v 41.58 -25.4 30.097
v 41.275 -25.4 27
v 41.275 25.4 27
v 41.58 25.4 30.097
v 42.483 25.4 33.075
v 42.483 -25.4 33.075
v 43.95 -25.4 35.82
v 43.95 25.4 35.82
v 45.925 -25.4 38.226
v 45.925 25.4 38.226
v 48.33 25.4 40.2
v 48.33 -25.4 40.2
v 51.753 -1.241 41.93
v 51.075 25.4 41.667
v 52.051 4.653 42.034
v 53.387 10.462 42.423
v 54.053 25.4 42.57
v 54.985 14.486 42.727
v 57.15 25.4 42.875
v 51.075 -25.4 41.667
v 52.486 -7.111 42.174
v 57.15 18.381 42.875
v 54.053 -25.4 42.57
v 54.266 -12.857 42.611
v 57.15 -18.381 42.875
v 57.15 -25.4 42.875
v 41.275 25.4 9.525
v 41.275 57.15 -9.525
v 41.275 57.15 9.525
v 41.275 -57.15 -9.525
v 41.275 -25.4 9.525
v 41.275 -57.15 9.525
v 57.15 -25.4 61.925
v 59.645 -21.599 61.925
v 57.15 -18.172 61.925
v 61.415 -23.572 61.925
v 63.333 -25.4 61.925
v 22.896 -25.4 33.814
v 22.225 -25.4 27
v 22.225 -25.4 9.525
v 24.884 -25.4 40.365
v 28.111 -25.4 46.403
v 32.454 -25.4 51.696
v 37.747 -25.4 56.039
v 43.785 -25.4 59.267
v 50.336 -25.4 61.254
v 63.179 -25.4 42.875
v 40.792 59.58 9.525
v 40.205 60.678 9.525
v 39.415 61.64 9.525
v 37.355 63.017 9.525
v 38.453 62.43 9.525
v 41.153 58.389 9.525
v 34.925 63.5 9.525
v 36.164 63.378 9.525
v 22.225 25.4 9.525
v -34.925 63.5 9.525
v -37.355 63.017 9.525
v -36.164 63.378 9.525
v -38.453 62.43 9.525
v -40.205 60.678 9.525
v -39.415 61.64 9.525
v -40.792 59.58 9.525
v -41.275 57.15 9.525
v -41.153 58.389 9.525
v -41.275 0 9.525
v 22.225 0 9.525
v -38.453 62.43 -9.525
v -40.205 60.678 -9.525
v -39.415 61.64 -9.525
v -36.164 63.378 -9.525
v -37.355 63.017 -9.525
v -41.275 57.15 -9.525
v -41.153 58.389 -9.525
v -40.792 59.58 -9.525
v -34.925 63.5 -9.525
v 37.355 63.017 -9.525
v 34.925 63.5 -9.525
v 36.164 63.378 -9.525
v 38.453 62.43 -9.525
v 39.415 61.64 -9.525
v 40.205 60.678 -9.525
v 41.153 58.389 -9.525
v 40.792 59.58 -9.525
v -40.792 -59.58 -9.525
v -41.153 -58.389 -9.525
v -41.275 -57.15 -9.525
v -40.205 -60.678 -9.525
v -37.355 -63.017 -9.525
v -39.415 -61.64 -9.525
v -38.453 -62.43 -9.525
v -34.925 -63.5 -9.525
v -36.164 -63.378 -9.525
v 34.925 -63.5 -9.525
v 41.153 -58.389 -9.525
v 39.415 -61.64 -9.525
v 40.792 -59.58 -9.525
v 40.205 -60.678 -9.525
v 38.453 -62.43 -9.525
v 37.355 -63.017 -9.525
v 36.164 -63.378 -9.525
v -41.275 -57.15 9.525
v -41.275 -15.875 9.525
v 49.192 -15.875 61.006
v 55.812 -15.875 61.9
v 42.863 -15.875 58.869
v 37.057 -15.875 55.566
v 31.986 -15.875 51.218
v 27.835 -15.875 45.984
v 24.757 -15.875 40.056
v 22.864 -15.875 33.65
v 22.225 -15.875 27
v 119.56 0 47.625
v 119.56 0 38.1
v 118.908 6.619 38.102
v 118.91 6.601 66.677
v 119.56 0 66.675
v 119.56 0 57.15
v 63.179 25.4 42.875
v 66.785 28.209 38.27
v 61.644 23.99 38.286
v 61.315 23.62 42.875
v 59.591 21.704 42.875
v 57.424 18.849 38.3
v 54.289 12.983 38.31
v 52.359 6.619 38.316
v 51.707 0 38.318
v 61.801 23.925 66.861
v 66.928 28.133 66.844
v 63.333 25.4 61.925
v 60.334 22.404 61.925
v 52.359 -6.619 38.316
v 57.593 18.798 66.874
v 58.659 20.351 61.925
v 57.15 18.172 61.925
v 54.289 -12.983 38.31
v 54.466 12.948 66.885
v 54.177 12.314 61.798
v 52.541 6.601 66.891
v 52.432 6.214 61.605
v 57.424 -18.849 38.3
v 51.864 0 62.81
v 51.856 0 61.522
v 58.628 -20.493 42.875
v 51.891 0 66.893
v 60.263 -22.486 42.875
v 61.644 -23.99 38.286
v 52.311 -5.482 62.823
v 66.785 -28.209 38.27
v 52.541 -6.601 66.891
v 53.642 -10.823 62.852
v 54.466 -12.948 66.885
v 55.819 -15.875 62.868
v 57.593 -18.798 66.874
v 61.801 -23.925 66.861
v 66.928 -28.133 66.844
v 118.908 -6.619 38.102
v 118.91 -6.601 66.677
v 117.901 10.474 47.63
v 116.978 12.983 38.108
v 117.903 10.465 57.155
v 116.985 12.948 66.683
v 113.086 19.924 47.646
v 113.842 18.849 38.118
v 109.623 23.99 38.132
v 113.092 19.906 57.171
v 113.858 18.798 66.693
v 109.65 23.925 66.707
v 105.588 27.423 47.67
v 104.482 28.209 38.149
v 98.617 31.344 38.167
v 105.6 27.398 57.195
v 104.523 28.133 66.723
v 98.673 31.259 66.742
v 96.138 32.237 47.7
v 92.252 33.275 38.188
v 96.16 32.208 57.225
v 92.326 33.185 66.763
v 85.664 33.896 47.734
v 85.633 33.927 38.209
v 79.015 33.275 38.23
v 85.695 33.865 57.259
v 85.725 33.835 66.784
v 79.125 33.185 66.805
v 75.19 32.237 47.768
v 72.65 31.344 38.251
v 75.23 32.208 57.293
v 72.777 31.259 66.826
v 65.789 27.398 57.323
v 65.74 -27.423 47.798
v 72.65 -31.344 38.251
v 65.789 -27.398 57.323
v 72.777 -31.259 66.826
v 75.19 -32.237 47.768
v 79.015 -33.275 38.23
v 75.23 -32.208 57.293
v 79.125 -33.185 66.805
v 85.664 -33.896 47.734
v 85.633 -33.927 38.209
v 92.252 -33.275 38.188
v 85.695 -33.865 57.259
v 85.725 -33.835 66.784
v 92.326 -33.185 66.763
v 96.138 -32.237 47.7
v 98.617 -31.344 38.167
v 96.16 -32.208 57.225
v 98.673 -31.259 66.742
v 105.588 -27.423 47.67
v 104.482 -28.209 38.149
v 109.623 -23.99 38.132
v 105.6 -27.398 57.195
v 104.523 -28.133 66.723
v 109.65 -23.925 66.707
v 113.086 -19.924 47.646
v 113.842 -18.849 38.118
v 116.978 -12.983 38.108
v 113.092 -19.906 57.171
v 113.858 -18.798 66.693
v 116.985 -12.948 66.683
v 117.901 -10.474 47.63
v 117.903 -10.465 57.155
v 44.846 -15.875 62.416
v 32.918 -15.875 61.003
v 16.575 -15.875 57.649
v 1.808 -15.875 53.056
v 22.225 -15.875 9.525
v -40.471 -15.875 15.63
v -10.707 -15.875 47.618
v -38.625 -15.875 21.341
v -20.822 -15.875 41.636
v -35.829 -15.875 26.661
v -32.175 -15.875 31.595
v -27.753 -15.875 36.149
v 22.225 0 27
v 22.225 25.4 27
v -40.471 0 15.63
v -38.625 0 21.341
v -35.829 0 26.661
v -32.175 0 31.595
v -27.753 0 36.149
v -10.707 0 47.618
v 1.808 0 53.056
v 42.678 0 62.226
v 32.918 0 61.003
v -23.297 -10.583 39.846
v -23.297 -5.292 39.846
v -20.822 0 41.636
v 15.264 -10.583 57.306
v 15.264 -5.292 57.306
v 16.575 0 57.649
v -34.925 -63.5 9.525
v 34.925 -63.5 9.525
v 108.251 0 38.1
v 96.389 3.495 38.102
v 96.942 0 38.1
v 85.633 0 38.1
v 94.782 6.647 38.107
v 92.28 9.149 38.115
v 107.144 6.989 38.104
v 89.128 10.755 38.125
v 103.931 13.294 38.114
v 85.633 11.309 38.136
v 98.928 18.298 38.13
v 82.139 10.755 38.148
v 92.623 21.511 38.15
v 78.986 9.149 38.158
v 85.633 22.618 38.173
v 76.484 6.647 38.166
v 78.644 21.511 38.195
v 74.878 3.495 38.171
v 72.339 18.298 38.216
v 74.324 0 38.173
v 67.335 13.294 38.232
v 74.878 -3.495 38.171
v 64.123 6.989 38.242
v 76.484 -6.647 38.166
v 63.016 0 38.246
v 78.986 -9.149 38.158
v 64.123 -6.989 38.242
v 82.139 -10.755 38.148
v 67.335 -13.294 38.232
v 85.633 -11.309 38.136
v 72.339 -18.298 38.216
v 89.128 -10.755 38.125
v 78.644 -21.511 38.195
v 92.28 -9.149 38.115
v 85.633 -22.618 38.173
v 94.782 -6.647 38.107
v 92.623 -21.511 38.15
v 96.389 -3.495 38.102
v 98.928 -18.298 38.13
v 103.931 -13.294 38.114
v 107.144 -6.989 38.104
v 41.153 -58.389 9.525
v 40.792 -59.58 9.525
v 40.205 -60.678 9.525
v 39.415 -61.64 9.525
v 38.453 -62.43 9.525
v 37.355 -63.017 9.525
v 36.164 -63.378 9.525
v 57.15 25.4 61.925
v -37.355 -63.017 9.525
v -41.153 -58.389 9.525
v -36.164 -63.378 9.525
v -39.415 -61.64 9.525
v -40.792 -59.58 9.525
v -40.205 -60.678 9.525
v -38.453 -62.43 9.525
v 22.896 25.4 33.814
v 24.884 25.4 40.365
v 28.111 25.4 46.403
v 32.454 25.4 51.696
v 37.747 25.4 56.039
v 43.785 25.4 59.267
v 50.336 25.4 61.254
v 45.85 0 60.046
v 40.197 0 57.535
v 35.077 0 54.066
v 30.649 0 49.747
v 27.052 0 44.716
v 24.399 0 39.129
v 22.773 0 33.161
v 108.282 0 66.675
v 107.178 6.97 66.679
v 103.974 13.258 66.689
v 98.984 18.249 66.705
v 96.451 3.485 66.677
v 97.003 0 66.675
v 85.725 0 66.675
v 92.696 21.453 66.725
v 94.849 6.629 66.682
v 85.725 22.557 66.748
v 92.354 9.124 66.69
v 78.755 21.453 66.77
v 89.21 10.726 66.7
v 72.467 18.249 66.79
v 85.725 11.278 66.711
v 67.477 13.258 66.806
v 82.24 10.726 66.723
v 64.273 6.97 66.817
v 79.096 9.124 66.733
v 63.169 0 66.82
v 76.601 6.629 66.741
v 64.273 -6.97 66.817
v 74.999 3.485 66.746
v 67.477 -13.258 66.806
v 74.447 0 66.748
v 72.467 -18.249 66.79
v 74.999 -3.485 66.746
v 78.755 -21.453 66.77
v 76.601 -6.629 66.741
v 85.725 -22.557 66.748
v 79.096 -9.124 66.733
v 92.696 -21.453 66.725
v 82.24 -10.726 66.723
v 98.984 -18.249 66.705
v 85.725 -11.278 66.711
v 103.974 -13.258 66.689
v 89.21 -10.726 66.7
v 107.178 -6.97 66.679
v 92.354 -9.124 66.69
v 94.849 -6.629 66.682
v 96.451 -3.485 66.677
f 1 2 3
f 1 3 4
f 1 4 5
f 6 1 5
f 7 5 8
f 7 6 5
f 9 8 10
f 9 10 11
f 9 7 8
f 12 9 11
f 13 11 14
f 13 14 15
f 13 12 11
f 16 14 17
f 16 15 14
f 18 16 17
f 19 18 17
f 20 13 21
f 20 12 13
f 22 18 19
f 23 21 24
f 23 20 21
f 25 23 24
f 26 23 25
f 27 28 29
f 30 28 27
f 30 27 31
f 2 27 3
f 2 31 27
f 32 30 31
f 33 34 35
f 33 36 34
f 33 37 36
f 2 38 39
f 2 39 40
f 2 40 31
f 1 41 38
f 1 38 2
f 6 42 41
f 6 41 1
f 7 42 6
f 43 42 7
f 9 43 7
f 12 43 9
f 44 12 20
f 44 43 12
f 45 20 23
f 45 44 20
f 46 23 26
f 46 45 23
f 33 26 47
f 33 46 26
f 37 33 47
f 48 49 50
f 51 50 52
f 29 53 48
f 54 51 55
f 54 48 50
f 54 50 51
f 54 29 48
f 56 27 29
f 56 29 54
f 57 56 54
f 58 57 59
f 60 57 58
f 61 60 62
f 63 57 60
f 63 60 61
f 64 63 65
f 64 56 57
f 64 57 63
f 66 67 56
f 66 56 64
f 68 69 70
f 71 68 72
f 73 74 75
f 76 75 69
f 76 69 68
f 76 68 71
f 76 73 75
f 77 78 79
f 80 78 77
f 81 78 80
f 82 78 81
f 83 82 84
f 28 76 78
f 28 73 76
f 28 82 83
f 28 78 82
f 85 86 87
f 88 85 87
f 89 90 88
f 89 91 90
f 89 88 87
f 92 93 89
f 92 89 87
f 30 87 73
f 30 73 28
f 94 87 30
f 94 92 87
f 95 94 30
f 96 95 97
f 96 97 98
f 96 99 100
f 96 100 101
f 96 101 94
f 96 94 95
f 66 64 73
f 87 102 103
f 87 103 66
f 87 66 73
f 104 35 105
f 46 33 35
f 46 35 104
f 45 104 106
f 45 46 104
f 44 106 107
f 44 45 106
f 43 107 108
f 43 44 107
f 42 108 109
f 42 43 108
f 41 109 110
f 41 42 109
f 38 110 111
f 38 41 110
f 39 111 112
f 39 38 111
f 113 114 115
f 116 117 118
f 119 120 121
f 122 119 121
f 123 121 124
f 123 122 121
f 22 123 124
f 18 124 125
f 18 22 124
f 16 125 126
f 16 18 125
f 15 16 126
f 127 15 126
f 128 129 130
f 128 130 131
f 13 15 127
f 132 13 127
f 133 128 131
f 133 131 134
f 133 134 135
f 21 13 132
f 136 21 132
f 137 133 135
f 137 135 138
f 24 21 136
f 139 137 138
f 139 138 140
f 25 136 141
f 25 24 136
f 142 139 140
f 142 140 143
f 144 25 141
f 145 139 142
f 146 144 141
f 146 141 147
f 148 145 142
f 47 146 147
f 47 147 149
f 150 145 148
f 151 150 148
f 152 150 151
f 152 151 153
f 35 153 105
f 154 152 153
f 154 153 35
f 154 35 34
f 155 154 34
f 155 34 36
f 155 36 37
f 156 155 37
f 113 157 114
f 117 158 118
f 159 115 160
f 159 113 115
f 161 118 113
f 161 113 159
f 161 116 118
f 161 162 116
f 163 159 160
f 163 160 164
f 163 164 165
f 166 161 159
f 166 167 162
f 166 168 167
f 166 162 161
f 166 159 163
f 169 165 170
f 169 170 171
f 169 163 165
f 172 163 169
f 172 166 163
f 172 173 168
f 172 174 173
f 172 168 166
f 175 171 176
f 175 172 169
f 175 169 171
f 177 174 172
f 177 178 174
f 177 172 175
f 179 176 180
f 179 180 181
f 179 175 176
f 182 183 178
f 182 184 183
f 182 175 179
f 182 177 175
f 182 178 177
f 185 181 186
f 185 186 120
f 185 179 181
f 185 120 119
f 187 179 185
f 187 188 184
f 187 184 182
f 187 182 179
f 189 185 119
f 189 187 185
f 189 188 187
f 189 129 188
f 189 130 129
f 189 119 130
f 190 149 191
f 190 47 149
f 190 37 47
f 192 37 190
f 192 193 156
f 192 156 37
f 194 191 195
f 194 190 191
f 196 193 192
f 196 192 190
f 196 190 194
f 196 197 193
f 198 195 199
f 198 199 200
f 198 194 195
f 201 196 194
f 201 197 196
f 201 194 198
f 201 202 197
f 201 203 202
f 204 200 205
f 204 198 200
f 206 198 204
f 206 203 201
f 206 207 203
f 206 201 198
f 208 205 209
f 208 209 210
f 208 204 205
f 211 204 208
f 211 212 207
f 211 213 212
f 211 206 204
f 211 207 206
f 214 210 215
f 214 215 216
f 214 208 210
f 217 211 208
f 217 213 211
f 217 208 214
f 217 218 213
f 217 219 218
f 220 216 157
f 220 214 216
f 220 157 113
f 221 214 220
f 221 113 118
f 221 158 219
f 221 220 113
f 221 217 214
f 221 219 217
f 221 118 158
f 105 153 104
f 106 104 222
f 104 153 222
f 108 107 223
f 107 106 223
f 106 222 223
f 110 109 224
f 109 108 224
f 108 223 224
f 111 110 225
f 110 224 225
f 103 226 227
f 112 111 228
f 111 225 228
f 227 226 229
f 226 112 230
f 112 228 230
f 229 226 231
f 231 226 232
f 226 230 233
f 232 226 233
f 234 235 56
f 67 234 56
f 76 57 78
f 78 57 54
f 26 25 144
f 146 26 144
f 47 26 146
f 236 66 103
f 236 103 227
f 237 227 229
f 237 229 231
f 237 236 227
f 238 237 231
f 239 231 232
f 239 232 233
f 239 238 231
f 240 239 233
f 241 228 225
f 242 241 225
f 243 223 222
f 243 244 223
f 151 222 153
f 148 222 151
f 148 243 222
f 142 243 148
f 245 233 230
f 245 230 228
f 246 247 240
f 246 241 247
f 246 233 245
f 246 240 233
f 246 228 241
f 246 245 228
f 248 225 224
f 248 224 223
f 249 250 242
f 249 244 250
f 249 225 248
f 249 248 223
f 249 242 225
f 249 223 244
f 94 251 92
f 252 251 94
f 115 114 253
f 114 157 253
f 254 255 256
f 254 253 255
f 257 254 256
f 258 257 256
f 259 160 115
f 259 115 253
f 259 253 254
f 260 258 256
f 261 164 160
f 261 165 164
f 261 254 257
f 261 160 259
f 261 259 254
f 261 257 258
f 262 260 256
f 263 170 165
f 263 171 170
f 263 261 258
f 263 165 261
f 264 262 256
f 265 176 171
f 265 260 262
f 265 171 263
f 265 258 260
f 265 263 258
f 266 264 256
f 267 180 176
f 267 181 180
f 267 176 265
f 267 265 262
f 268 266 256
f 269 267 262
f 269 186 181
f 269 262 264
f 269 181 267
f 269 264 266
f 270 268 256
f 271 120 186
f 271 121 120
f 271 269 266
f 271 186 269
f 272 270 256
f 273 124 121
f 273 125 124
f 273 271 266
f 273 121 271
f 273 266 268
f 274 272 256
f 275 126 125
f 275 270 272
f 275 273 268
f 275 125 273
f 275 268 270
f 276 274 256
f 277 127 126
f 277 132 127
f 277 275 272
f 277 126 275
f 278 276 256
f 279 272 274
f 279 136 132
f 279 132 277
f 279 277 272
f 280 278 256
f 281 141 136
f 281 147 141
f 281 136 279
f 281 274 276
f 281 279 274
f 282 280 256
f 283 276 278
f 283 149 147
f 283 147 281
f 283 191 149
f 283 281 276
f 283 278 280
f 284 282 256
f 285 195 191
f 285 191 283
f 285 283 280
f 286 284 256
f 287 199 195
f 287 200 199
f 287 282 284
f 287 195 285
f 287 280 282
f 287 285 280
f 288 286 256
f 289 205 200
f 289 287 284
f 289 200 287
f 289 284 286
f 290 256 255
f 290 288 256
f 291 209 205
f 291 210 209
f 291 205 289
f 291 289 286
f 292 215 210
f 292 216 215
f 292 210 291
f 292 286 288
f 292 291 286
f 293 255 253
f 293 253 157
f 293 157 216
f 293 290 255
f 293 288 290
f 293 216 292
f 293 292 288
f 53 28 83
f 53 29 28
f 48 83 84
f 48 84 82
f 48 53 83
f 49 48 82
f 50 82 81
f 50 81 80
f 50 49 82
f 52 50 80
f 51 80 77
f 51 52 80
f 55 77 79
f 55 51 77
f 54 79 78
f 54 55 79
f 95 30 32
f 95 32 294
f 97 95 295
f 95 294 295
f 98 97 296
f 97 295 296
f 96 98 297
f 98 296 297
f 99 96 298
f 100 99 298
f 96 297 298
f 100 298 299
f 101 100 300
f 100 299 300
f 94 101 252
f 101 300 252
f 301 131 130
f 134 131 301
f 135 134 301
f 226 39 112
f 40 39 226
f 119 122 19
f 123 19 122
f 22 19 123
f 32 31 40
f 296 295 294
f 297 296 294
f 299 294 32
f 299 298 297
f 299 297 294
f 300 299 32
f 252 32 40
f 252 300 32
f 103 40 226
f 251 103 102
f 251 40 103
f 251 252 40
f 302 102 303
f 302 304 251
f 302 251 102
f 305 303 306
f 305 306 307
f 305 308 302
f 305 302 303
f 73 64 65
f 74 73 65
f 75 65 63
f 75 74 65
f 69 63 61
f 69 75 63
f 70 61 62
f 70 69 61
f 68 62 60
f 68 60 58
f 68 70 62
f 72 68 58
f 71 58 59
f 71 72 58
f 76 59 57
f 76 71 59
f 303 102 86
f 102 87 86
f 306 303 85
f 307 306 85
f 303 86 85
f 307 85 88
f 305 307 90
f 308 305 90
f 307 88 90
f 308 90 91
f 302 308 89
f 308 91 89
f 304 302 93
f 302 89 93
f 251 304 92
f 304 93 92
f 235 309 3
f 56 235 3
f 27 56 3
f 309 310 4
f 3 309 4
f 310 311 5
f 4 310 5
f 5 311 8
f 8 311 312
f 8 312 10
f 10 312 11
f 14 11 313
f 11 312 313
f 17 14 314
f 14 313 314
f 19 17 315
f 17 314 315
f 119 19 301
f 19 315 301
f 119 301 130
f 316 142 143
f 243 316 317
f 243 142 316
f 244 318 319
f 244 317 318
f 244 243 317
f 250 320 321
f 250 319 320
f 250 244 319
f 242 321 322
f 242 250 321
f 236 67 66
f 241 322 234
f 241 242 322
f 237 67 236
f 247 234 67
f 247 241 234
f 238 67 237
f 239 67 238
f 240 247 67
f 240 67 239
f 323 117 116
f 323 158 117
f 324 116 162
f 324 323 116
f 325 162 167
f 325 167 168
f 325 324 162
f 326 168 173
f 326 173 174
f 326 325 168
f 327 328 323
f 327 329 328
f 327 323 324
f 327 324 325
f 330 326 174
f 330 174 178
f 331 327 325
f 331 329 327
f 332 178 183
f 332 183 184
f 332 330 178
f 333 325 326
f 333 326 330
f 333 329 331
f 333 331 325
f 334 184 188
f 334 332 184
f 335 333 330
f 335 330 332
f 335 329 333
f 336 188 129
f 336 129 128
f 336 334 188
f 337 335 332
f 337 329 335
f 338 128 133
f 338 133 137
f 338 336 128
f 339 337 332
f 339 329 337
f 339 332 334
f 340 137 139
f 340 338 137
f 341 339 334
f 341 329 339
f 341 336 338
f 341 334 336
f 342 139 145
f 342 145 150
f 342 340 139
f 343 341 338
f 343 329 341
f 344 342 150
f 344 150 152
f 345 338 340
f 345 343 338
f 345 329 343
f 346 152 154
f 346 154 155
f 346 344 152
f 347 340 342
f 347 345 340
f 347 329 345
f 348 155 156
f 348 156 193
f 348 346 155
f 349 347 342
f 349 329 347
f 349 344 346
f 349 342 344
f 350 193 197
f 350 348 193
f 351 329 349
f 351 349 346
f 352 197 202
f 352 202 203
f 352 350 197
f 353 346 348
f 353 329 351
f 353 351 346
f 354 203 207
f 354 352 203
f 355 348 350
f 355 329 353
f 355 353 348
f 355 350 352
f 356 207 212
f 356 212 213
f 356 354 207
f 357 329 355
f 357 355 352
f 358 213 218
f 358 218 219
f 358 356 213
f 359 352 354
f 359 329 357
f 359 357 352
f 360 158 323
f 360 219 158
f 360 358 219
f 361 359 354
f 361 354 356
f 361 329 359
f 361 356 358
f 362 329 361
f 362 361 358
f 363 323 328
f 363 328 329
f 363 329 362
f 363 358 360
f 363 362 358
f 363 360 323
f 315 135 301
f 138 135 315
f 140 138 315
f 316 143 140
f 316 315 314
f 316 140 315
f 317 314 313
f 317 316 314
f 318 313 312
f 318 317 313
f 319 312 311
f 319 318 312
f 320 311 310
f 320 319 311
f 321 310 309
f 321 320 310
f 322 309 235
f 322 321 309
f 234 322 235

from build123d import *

# Parameters (mm, degrees)
F1_DEPTH = 63.5
F2_DEPTH = 25.4
F3_DEPTH = 15.875
F5_R     = 6.35


with BuildPart() as f1:
    # F0 (on Front) → F1 (new body, symmetric)
    with BuildSketch(Plane.XZ):
        Polygon((22.225, 9.525), (-41.275, 9.525), (-41.275, -9.525), (41.275, -9.525), (41.275, 9.525), align=None)
    extrude(amount=F1_DEPTH, both=True)

    # F0 (on Front) → F2 (join, symmetric)
    with BuildSketch(Plane.XZ):
        with BuildLine():
            Line((22.225, 27.0002), (22.225, 9.525))
            Line((22.225, 9.525), (41.275, 9.525))
            Line((41.275, 9.525), (41.275, 27.0002))
            ThreePointArc((41.275, 27.0002), (45.9246798487, 38.2255201513), (57.15, 42.8752))
            Line((57.15, 42.8752), (68.7600185826, 42.8752))
            Line((68.7600185826, 42.8752), (85.6484008946, 42.8752))
            Line((85.6484008946, 42.8752), (85.7097128786, 61.9252))
            Line((85.7097128786, 61.9252), (68.7600185826, 61.9252))
            Line((68.7600185826, 61.9252), (57.15, 61.9252))
            ThreePointArc((57.15, 61.9252), (32.4542956671, 51.6959043329), (22.225, 27.0002))
        make_face()
    extrude(amount=F2_DEPTH, both=True)

    # F0 (on Front) → F3 (join)
    with BuildSketch(Plane.XZ):
        with BuildLine():
            add(Edge.make_bspline(
                [(-41.275, 9.525), (-39.5817421377, 51.6913831234), (38.1245203316, 67.0281425118), (68.7600185826, 61.9252)],
                knots=[0, 0, 0, 0, 121.8748795877, 121.8748795877, 121.8748795877, 121.8748795877], degree=3))
            Line((-41.275, 9.525), (22.225, 9.525))
            Line((22.225, 9.525), (22.225, 27.0002))
            ThreePointArc((22.225, 27.0002), (32.4542956671, 51.6959043329), (57.15, 61.9252))
            Line((57.15, 61.9252), (68.7600185826, 61.9252))
        make_face()
    extrude(amount=F3_DEPTH)

    # F0 (on Front) → F4 (revolve)
    with BuildSketch(Plane.XZ):
        Polygon((85.725, 66.675), (85.7097128786, 61.9252), (85.6484008946, 42.8752), (85.6330320239, 38.1), (119.5600185826, 38.1), (119.5600185826, 66.675), align=None)
    revolve(axis=Axis((85.679016012, 0, 52.3875), (0.0032184602, 0, 0.9999948207)))

    # F5
    f5_edges = [f1.edges().sort_by_distance(p)[0] for p in [
        (-41.275, -63.5, 0),
        (41.275, -63.5, 0),
        (41.275, 63.5, 0),
        (-41.275, 63.5, 0),
    ]]
    fillet(f5_edges, radius=F5_R)


solid = f1.part
